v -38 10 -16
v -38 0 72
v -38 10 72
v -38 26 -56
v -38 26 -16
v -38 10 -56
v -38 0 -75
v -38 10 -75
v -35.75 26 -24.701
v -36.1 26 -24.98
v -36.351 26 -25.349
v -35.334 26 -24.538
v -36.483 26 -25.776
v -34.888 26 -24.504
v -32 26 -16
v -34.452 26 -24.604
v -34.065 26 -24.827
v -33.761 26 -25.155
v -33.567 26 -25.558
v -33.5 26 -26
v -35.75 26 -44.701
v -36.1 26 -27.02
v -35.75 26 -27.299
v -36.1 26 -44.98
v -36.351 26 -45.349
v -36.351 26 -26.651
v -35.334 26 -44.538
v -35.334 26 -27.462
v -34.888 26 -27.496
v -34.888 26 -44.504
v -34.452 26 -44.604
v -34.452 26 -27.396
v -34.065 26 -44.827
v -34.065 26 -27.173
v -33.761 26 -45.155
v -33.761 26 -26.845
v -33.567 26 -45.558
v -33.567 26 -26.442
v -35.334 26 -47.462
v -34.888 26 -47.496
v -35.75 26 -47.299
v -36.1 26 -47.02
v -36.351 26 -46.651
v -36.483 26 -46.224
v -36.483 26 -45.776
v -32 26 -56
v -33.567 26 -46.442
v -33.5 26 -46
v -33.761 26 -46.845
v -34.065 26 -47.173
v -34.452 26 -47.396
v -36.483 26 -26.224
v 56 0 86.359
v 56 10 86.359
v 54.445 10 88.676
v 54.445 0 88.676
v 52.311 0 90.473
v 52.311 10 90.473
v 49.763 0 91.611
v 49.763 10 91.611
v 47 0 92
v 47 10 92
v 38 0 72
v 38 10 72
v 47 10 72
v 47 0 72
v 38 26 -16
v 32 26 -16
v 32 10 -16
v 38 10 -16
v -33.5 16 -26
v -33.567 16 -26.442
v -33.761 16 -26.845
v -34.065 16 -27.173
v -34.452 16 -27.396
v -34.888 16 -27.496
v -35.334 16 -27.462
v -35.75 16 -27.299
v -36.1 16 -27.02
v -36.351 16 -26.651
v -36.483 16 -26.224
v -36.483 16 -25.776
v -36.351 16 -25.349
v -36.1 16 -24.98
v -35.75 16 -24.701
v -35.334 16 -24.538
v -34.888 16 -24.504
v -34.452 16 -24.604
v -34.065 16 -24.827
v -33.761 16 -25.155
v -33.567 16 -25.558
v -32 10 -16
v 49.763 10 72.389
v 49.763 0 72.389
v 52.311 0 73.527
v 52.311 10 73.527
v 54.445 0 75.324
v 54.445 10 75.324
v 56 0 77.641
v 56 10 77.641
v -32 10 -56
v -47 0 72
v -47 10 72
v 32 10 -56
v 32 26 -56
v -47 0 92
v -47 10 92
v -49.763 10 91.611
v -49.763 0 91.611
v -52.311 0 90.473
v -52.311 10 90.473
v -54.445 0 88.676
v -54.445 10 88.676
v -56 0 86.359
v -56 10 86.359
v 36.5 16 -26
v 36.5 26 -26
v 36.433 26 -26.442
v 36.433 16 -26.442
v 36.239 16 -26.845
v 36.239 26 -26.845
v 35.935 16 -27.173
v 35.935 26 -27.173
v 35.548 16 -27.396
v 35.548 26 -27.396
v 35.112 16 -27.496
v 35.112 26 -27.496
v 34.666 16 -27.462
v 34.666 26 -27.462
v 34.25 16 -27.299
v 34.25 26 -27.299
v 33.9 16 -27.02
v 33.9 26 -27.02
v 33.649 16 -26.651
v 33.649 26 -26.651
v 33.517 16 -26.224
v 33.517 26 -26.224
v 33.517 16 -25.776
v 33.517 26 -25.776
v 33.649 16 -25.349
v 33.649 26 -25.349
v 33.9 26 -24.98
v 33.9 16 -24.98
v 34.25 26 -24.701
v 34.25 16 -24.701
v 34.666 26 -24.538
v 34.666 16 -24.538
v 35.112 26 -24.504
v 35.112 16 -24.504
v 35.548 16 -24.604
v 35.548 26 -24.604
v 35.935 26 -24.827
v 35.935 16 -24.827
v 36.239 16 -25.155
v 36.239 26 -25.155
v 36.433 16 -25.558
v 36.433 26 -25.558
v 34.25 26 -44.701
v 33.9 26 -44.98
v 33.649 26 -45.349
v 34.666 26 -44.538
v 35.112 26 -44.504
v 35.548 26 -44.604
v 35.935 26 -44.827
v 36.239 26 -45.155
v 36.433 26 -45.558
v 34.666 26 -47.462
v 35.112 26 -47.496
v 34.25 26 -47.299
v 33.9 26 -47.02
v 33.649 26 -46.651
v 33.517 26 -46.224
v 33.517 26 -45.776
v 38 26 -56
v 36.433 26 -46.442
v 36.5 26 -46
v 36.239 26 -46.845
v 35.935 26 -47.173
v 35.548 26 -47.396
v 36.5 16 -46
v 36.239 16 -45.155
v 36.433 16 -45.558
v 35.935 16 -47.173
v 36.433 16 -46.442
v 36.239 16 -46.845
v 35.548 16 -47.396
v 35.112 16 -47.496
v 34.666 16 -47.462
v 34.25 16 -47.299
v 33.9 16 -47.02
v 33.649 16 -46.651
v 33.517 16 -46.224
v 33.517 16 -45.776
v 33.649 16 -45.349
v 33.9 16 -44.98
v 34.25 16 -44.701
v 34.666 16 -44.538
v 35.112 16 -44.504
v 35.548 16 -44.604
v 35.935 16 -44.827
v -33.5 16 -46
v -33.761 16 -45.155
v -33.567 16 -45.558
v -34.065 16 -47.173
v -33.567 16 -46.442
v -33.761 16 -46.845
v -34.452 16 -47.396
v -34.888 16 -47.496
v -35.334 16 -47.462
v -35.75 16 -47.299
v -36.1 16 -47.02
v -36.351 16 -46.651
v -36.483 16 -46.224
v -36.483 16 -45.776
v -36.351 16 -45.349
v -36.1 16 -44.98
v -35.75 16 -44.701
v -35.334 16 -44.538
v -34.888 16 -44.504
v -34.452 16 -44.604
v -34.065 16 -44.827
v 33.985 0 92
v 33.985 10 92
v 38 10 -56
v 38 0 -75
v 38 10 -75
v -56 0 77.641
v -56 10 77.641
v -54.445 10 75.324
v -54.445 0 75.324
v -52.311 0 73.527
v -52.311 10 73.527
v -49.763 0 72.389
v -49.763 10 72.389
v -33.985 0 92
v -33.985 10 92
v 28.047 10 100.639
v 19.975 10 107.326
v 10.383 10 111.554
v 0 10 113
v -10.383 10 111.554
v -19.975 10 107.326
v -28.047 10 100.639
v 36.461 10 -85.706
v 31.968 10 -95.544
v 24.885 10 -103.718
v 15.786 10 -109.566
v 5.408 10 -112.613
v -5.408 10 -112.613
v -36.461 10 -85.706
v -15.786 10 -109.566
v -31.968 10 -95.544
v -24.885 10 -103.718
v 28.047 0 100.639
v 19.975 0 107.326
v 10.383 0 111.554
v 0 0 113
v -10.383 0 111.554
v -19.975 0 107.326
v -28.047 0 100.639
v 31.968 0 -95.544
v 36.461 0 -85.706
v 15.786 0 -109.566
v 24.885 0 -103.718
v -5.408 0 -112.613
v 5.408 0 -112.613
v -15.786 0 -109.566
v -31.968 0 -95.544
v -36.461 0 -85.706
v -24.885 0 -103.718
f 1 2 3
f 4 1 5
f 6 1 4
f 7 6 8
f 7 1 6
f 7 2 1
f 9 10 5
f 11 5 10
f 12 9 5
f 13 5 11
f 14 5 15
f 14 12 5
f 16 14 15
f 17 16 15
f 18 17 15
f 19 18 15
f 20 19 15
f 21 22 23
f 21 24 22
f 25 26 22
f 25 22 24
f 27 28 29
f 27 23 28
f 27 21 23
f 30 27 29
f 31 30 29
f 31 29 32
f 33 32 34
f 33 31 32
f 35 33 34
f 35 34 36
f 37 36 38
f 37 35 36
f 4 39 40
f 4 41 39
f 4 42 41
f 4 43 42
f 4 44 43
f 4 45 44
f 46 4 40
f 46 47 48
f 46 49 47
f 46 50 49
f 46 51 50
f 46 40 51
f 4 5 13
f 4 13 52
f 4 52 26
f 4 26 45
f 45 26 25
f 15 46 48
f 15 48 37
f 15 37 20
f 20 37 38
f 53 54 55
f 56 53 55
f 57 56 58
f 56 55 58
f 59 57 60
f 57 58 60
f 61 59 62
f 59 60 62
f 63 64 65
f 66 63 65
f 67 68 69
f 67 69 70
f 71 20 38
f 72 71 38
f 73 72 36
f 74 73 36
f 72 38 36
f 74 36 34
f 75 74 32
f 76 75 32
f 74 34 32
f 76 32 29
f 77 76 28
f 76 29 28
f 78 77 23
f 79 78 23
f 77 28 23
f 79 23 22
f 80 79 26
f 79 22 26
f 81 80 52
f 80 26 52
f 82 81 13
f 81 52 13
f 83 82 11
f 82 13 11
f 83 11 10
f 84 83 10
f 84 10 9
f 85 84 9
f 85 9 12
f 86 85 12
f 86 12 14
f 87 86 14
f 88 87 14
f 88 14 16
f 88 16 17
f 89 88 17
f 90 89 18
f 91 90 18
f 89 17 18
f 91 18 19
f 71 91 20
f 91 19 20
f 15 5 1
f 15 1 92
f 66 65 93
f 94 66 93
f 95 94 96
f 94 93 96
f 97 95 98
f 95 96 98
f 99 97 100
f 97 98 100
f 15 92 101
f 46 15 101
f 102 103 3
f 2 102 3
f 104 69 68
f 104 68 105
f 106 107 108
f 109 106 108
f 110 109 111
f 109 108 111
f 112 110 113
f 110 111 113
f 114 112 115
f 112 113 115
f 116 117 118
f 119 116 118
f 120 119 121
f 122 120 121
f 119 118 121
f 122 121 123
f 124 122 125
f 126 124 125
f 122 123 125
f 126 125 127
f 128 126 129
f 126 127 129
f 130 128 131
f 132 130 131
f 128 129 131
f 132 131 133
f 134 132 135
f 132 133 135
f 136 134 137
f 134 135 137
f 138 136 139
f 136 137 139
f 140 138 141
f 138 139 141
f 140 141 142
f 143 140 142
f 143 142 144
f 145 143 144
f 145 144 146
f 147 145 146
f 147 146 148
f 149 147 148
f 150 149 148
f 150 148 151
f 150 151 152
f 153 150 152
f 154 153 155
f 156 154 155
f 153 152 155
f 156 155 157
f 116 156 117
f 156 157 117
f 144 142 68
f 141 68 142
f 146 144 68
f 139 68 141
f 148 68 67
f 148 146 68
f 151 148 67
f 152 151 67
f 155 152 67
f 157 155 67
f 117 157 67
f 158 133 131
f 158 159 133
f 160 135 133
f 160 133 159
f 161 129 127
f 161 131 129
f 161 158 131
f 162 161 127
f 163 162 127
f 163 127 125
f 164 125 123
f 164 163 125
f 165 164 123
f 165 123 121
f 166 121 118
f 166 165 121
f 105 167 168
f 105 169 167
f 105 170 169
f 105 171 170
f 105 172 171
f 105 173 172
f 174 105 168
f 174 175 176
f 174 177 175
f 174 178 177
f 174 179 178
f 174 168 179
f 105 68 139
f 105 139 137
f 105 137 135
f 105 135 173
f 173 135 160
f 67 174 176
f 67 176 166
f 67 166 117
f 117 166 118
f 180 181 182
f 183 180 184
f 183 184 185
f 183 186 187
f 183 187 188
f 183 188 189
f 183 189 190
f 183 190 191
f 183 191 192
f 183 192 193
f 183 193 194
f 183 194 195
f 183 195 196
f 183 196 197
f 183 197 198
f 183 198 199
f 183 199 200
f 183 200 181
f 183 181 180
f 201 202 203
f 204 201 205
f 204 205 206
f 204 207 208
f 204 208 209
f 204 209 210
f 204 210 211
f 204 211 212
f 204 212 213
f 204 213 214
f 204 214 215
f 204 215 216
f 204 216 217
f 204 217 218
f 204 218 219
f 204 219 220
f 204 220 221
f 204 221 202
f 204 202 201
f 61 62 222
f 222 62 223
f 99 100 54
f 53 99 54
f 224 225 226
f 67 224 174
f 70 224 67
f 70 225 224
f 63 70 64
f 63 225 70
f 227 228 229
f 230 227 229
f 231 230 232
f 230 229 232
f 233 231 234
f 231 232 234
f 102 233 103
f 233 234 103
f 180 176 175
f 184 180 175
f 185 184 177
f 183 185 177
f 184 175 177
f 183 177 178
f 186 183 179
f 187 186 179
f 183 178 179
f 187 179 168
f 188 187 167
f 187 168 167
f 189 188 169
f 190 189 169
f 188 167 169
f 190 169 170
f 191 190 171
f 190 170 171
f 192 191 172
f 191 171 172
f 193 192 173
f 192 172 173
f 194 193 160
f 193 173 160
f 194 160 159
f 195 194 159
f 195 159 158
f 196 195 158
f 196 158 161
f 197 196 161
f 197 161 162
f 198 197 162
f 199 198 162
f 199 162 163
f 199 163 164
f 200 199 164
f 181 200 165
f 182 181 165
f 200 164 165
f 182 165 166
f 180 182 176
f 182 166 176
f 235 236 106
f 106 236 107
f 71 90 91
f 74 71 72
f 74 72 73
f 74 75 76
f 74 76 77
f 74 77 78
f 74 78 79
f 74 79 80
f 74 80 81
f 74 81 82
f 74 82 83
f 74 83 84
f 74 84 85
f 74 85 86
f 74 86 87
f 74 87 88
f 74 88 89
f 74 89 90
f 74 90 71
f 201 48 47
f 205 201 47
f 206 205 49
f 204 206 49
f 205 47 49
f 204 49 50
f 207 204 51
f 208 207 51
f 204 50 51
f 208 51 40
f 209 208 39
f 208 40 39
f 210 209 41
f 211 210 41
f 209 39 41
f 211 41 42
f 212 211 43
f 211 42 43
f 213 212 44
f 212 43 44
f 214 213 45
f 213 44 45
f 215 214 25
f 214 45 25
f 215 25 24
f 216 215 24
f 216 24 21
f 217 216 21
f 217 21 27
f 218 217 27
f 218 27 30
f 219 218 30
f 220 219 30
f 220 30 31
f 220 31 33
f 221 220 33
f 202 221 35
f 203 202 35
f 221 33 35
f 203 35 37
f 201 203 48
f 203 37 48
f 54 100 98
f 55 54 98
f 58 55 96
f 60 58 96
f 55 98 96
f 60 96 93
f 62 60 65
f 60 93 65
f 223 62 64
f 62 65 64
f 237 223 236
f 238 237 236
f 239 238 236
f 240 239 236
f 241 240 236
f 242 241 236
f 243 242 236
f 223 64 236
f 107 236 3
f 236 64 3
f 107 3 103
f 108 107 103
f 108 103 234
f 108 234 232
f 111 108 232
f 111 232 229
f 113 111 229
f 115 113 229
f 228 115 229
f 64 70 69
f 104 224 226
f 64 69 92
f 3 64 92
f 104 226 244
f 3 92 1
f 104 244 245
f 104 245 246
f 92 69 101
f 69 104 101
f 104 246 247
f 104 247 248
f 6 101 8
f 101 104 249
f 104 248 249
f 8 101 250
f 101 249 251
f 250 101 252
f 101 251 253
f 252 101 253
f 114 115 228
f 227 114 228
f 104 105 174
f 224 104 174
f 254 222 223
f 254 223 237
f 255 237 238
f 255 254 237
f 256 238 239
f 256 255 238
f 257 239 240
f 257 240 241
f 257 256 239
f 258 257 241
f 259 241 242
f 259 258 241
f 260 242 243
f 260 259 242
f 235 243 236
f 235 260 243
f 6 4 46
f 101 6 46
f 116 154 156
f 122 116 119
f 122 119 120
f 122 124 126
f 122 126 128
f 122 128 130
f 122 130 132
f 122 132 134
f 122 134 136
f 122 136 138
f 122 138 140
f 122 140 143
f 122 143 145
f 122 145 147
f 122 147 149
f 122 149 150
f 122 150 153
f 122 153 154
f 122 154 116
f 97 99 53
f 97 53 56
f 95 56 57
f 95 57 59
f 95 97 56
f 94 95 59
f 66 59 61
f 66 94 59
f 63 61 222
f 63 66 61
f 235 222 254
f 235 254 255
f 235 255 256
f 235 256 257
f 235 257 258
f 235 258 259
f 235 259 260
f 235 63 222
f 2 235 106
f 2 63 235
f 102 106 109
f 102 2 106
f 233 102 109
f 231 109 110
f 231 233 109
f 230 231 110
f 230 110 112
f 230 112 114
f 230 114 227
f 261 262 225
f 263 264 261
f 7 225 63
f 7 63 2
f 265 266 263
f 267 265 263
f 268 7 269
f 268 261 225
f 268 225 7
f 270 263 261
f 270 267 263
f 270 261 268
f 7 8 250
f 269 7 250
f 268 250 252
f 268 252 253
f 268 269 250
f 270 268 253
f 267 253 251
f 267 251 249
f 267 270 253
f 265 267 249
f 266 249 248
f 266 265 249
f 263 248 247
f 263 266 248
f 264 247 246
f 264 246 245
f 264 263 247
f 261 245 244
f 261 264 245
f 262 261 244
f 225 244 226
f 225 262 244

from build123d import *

# Parameters (mm, degrees)
EXTRUDE_1_DEPTH     = 10
SKETCH_4_W          = 6
SKETCH_4_H          = 40
EXTRUDE_3_DEPTH     = 16
SKETCH_7_R          = 1.5
CUT_EXTRUDE_3_DEPTH = 10
EXTRUDE_4_DEPTH     = 10


with BuildPart() as part:
    # 草图1 → 凸台-拉伸1 (new body)
    with BuildSketch(Plane(origin=(0, 0, 0), x_dir=(1, 0, 0), z_dir=(0, 1, 0))):
        with BuildLine():
            Line((-38, -75), (-38, 75))
            ThreePointArc((-38, 75), (0, 113), (38, 75))
            Line((38, 75), (38, -75))
            ThreePointArc((38, -75), (0, -113), (-38, -75))
        make_face()
    extrude(amount=EXTRUDE_1_DEPTH)

    # 草图4 → 凸台-拉伸3 (add)
    with BuildSketch(Plane(origin=(0, 10, 0), x_dir=(1, 0, 0), z_dir=(0, 1, 0))):
        with Locations((-35, 36)):
            Rectangle(SKETCH_4_W, SKETCH_4_H)
        with Locations((35, 36)):
            Rectangle(SKETCH_4_W, SKETCH_4_H)
    extrude(amount=EXTRUDE_3_DEPTH)

    # 草图7 → 切除-拉伸3 (cut)
    with BuildSketch(Plane(origin=(0, 26, 0), x_dir=(1, 0, 0), z_dir=(0, 1, 0))):
        with Locations((-35, 26)):
            Circle(SKETCH_7_R)
        with Locations((-35, 46)):
            Circle(SKETCH_7_R)
        with Locations((35, 26)):
            Circle(SKETCH_7_R)
        with Locations((35, 46)):
            Circle(SKETCH_7_R)
    extrude(amount=-CUT_EXTRUDE_3_DEPTH, mode=Mode.SUBTRACT)

    # 草图8 → 凸台-拉伸4 (add)
    with BuildSketch(Plane(origin=(0, 10, 0), x_dir=(1, 0, 0), z_dir=(0, 1, 0))):
        with BuildLine():
            Line((-47, -72), (47, -72))
            ThreePointArc((47, -72), (52.310885546, -73.526836794), (56, -77.641101056))
            Line((56, -77.641101056), (56, -86.358898944))
            ThreePointArc((56, -86.358898944), (52.310885546, -90.473163206), (47, -92))
            Line((47, -92), (-47, -92))
            ThreePointArc((-47, -92), (-52.310885546, -90.473163206), (-56, -86.358898944))
            Line((-56, -86.358898944), (-56, -77.641101056))
            ThreePointArc((-56, -77.641101056), (-52.310885546, -73.526836794), (-47, -72))
        make_face()
    extrude(amount=-EXTRUDE_4_DEPTH)


solid = part.part
